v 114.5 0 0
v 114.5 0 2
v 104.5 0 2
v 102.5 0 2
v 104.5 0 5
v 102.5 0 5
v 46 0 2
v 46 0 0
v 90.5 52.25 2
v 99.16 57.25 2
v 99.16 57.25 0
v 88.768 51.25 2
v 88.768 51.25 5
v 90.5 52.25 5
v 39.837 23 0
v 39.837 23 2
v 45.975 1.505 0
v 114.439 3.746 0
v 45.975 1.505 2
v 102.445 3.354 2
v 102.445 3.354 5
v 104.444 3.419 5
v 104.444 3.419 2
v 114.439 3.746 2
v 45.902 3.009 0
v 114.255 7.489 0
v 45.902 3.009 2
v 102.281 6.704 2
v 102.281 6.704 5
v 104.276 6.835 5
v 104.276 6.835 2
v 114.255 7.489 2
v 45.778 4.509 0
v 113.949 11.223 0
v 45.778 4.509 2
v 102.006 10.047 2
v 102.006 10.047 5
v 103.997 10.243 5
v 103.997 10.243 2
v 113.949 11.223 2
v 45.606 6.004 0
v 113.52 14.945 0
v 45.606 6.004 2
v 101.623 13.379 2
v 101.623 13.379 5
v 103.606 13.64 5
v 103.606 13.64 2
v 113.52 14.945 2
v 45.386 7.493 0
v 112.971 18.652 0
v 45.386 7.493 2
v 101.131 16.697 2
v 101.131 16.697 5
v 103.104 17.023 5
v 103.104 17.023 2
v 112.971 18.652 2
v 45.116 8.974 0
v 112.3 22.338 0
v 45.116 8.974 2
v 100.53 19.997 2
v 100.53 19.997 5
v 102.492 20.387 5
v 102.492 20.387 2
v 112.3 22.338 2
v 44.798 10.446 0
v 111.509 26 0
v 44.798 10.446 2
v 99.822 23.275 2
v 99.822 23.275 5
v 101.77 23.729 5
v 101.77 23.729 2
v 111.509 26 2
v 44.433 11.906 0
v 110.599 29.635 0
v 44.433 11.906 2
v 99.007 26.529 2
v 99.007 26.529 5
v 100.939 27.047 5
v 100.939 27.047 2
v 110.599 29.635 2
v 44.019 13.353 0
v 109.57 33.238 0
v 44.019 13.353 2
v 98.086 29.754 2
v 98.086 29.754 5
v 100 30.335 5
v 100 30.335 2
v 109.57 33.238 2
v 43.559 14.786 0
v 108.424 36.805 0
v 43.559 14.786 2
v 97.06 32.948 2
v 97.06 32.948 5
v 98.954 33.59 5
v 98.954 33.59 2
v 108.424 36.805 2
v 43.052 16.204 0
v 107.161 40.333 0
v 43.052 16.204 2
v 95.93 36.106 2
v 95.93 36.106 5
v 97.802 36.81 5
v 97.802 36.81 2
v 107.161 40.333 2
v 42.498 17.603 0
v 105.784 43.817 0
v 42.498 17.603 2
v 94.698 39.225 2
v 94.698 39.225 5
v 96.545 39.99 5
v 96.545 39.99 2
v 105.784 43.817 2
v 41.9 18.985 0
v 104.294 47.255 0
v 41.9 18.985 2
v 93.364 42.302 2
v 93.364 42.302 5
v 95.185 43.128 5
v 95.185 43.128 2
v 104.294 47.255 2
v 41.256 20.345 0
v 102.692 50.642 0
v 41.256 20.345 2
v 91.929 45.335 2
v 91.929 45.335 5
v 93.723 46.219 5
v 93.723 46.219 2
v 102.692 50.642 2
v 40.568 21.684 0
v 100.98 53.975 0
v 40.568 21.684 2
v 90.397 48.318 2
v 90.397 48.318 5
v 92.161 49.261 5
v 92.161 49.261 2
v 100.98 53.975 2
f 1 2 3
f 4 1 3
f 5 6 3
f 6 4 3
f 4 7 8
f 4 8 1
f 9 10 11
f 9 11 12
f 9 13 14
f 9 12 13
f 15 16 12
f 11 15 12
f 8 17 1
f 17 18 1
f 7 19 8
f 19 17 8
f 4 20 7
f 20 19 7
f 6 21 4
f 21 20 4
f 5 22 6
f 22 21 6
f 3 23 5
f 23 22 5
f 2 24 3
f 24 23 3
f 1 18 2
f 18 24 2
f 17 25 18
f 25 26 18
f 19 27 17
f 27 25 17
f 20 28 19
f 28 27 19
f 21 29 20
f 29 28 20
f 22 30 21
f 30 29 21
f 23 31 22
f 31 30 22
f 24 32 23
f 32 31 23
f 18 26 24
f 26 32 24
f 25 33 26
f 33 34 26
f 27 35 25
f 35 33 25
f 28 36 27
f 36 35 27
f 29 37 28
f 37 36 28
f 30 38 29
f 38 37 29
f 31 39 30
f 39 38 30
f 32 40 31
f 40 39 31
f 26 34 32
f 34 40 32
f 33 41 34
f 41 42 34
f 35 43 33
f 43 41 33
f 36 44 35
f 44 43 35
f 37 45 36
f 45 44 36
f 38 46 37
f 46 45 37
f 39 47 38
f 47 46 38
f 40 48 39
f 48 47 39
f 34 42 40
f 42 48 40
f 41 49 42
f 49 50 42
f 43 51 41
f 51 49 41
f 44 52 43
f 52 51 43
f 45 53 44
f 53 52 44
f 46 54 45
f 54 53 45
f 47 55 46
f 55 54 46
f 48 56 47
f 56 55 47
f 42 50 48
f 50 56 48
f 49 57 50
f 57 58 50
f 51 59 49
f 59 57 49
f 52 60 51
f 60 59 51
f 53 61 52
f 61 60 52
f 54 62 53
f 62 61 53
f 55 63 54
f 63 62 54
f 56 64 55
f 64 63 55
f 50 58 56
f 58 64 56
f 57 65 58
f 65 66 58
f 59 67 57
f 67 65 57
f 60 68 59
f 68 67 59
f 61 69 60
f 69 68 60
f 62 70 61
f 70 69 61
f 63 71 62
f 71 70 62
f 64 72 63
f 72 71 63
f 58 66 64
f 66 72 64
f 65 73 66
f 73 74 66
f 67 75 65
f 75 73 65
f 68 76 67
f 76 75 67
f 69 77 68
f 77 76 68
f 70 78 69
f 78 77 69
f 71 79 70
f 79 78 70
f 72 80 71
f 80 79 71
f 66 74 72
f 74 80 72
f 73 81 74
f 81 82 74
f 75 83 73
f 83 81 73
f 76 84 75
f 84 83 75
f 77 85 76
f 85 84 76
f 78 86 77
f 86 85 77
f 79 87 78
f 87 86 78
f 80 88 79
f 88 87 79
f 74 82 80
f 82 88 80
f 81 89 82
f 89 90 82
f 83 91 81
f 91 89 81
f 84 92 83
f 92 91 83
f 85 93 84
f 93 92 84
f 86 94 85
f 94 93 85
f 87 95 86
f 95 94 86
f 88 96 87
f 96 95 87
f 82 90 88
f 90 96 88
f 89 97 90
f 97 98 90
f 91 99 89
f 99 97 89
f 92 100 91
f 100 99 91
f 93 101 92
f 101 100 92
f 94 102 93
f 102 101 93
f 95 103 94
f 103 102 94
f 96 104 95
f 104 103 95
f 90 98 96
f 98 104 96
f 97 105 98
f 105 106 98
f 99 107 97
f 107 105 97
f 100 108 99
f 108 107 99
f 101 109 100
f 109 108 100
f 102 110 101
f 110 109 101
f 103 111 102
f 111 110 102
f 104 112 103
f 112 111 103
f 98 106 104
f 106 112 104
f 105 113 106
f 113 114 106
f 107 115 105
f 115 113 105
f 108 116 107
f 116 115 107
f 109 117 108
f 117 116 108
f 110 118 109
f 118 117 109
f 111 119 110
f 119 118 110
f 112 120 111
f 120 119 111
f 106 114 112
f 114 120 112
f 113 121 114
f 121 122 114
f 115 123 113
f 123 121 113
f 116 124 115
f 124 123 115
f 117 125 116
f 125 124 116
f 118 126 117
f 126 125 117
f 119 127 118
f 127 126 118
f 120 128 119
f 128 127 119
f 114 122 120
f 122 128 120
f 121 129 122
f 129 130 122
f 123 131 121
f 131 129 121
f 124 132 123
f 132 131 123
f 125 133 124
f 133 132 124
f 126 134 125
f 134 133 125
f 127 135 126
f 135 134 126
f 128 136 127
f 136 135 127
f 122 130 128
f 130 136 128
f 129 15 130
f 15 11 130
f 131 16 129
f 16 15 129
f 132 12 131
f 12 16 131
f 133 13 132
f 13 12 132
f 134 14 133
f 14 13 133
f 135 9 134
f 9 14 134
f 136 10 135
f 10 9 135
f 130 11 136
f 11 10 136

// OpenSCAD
router=92;
ring=209;
ring_grip=10;
space=(ring-router)/2;
ring_h=3;
base=2;
wall=2;
$fn=200;

module profile() {
    translate([ring/2-wall,0])
    square([wall,base+ring_h]);
    translate([router/2,0])
    square([space+ring_grip,base]);
}

rotate_extrude(angle=30)
profile();
